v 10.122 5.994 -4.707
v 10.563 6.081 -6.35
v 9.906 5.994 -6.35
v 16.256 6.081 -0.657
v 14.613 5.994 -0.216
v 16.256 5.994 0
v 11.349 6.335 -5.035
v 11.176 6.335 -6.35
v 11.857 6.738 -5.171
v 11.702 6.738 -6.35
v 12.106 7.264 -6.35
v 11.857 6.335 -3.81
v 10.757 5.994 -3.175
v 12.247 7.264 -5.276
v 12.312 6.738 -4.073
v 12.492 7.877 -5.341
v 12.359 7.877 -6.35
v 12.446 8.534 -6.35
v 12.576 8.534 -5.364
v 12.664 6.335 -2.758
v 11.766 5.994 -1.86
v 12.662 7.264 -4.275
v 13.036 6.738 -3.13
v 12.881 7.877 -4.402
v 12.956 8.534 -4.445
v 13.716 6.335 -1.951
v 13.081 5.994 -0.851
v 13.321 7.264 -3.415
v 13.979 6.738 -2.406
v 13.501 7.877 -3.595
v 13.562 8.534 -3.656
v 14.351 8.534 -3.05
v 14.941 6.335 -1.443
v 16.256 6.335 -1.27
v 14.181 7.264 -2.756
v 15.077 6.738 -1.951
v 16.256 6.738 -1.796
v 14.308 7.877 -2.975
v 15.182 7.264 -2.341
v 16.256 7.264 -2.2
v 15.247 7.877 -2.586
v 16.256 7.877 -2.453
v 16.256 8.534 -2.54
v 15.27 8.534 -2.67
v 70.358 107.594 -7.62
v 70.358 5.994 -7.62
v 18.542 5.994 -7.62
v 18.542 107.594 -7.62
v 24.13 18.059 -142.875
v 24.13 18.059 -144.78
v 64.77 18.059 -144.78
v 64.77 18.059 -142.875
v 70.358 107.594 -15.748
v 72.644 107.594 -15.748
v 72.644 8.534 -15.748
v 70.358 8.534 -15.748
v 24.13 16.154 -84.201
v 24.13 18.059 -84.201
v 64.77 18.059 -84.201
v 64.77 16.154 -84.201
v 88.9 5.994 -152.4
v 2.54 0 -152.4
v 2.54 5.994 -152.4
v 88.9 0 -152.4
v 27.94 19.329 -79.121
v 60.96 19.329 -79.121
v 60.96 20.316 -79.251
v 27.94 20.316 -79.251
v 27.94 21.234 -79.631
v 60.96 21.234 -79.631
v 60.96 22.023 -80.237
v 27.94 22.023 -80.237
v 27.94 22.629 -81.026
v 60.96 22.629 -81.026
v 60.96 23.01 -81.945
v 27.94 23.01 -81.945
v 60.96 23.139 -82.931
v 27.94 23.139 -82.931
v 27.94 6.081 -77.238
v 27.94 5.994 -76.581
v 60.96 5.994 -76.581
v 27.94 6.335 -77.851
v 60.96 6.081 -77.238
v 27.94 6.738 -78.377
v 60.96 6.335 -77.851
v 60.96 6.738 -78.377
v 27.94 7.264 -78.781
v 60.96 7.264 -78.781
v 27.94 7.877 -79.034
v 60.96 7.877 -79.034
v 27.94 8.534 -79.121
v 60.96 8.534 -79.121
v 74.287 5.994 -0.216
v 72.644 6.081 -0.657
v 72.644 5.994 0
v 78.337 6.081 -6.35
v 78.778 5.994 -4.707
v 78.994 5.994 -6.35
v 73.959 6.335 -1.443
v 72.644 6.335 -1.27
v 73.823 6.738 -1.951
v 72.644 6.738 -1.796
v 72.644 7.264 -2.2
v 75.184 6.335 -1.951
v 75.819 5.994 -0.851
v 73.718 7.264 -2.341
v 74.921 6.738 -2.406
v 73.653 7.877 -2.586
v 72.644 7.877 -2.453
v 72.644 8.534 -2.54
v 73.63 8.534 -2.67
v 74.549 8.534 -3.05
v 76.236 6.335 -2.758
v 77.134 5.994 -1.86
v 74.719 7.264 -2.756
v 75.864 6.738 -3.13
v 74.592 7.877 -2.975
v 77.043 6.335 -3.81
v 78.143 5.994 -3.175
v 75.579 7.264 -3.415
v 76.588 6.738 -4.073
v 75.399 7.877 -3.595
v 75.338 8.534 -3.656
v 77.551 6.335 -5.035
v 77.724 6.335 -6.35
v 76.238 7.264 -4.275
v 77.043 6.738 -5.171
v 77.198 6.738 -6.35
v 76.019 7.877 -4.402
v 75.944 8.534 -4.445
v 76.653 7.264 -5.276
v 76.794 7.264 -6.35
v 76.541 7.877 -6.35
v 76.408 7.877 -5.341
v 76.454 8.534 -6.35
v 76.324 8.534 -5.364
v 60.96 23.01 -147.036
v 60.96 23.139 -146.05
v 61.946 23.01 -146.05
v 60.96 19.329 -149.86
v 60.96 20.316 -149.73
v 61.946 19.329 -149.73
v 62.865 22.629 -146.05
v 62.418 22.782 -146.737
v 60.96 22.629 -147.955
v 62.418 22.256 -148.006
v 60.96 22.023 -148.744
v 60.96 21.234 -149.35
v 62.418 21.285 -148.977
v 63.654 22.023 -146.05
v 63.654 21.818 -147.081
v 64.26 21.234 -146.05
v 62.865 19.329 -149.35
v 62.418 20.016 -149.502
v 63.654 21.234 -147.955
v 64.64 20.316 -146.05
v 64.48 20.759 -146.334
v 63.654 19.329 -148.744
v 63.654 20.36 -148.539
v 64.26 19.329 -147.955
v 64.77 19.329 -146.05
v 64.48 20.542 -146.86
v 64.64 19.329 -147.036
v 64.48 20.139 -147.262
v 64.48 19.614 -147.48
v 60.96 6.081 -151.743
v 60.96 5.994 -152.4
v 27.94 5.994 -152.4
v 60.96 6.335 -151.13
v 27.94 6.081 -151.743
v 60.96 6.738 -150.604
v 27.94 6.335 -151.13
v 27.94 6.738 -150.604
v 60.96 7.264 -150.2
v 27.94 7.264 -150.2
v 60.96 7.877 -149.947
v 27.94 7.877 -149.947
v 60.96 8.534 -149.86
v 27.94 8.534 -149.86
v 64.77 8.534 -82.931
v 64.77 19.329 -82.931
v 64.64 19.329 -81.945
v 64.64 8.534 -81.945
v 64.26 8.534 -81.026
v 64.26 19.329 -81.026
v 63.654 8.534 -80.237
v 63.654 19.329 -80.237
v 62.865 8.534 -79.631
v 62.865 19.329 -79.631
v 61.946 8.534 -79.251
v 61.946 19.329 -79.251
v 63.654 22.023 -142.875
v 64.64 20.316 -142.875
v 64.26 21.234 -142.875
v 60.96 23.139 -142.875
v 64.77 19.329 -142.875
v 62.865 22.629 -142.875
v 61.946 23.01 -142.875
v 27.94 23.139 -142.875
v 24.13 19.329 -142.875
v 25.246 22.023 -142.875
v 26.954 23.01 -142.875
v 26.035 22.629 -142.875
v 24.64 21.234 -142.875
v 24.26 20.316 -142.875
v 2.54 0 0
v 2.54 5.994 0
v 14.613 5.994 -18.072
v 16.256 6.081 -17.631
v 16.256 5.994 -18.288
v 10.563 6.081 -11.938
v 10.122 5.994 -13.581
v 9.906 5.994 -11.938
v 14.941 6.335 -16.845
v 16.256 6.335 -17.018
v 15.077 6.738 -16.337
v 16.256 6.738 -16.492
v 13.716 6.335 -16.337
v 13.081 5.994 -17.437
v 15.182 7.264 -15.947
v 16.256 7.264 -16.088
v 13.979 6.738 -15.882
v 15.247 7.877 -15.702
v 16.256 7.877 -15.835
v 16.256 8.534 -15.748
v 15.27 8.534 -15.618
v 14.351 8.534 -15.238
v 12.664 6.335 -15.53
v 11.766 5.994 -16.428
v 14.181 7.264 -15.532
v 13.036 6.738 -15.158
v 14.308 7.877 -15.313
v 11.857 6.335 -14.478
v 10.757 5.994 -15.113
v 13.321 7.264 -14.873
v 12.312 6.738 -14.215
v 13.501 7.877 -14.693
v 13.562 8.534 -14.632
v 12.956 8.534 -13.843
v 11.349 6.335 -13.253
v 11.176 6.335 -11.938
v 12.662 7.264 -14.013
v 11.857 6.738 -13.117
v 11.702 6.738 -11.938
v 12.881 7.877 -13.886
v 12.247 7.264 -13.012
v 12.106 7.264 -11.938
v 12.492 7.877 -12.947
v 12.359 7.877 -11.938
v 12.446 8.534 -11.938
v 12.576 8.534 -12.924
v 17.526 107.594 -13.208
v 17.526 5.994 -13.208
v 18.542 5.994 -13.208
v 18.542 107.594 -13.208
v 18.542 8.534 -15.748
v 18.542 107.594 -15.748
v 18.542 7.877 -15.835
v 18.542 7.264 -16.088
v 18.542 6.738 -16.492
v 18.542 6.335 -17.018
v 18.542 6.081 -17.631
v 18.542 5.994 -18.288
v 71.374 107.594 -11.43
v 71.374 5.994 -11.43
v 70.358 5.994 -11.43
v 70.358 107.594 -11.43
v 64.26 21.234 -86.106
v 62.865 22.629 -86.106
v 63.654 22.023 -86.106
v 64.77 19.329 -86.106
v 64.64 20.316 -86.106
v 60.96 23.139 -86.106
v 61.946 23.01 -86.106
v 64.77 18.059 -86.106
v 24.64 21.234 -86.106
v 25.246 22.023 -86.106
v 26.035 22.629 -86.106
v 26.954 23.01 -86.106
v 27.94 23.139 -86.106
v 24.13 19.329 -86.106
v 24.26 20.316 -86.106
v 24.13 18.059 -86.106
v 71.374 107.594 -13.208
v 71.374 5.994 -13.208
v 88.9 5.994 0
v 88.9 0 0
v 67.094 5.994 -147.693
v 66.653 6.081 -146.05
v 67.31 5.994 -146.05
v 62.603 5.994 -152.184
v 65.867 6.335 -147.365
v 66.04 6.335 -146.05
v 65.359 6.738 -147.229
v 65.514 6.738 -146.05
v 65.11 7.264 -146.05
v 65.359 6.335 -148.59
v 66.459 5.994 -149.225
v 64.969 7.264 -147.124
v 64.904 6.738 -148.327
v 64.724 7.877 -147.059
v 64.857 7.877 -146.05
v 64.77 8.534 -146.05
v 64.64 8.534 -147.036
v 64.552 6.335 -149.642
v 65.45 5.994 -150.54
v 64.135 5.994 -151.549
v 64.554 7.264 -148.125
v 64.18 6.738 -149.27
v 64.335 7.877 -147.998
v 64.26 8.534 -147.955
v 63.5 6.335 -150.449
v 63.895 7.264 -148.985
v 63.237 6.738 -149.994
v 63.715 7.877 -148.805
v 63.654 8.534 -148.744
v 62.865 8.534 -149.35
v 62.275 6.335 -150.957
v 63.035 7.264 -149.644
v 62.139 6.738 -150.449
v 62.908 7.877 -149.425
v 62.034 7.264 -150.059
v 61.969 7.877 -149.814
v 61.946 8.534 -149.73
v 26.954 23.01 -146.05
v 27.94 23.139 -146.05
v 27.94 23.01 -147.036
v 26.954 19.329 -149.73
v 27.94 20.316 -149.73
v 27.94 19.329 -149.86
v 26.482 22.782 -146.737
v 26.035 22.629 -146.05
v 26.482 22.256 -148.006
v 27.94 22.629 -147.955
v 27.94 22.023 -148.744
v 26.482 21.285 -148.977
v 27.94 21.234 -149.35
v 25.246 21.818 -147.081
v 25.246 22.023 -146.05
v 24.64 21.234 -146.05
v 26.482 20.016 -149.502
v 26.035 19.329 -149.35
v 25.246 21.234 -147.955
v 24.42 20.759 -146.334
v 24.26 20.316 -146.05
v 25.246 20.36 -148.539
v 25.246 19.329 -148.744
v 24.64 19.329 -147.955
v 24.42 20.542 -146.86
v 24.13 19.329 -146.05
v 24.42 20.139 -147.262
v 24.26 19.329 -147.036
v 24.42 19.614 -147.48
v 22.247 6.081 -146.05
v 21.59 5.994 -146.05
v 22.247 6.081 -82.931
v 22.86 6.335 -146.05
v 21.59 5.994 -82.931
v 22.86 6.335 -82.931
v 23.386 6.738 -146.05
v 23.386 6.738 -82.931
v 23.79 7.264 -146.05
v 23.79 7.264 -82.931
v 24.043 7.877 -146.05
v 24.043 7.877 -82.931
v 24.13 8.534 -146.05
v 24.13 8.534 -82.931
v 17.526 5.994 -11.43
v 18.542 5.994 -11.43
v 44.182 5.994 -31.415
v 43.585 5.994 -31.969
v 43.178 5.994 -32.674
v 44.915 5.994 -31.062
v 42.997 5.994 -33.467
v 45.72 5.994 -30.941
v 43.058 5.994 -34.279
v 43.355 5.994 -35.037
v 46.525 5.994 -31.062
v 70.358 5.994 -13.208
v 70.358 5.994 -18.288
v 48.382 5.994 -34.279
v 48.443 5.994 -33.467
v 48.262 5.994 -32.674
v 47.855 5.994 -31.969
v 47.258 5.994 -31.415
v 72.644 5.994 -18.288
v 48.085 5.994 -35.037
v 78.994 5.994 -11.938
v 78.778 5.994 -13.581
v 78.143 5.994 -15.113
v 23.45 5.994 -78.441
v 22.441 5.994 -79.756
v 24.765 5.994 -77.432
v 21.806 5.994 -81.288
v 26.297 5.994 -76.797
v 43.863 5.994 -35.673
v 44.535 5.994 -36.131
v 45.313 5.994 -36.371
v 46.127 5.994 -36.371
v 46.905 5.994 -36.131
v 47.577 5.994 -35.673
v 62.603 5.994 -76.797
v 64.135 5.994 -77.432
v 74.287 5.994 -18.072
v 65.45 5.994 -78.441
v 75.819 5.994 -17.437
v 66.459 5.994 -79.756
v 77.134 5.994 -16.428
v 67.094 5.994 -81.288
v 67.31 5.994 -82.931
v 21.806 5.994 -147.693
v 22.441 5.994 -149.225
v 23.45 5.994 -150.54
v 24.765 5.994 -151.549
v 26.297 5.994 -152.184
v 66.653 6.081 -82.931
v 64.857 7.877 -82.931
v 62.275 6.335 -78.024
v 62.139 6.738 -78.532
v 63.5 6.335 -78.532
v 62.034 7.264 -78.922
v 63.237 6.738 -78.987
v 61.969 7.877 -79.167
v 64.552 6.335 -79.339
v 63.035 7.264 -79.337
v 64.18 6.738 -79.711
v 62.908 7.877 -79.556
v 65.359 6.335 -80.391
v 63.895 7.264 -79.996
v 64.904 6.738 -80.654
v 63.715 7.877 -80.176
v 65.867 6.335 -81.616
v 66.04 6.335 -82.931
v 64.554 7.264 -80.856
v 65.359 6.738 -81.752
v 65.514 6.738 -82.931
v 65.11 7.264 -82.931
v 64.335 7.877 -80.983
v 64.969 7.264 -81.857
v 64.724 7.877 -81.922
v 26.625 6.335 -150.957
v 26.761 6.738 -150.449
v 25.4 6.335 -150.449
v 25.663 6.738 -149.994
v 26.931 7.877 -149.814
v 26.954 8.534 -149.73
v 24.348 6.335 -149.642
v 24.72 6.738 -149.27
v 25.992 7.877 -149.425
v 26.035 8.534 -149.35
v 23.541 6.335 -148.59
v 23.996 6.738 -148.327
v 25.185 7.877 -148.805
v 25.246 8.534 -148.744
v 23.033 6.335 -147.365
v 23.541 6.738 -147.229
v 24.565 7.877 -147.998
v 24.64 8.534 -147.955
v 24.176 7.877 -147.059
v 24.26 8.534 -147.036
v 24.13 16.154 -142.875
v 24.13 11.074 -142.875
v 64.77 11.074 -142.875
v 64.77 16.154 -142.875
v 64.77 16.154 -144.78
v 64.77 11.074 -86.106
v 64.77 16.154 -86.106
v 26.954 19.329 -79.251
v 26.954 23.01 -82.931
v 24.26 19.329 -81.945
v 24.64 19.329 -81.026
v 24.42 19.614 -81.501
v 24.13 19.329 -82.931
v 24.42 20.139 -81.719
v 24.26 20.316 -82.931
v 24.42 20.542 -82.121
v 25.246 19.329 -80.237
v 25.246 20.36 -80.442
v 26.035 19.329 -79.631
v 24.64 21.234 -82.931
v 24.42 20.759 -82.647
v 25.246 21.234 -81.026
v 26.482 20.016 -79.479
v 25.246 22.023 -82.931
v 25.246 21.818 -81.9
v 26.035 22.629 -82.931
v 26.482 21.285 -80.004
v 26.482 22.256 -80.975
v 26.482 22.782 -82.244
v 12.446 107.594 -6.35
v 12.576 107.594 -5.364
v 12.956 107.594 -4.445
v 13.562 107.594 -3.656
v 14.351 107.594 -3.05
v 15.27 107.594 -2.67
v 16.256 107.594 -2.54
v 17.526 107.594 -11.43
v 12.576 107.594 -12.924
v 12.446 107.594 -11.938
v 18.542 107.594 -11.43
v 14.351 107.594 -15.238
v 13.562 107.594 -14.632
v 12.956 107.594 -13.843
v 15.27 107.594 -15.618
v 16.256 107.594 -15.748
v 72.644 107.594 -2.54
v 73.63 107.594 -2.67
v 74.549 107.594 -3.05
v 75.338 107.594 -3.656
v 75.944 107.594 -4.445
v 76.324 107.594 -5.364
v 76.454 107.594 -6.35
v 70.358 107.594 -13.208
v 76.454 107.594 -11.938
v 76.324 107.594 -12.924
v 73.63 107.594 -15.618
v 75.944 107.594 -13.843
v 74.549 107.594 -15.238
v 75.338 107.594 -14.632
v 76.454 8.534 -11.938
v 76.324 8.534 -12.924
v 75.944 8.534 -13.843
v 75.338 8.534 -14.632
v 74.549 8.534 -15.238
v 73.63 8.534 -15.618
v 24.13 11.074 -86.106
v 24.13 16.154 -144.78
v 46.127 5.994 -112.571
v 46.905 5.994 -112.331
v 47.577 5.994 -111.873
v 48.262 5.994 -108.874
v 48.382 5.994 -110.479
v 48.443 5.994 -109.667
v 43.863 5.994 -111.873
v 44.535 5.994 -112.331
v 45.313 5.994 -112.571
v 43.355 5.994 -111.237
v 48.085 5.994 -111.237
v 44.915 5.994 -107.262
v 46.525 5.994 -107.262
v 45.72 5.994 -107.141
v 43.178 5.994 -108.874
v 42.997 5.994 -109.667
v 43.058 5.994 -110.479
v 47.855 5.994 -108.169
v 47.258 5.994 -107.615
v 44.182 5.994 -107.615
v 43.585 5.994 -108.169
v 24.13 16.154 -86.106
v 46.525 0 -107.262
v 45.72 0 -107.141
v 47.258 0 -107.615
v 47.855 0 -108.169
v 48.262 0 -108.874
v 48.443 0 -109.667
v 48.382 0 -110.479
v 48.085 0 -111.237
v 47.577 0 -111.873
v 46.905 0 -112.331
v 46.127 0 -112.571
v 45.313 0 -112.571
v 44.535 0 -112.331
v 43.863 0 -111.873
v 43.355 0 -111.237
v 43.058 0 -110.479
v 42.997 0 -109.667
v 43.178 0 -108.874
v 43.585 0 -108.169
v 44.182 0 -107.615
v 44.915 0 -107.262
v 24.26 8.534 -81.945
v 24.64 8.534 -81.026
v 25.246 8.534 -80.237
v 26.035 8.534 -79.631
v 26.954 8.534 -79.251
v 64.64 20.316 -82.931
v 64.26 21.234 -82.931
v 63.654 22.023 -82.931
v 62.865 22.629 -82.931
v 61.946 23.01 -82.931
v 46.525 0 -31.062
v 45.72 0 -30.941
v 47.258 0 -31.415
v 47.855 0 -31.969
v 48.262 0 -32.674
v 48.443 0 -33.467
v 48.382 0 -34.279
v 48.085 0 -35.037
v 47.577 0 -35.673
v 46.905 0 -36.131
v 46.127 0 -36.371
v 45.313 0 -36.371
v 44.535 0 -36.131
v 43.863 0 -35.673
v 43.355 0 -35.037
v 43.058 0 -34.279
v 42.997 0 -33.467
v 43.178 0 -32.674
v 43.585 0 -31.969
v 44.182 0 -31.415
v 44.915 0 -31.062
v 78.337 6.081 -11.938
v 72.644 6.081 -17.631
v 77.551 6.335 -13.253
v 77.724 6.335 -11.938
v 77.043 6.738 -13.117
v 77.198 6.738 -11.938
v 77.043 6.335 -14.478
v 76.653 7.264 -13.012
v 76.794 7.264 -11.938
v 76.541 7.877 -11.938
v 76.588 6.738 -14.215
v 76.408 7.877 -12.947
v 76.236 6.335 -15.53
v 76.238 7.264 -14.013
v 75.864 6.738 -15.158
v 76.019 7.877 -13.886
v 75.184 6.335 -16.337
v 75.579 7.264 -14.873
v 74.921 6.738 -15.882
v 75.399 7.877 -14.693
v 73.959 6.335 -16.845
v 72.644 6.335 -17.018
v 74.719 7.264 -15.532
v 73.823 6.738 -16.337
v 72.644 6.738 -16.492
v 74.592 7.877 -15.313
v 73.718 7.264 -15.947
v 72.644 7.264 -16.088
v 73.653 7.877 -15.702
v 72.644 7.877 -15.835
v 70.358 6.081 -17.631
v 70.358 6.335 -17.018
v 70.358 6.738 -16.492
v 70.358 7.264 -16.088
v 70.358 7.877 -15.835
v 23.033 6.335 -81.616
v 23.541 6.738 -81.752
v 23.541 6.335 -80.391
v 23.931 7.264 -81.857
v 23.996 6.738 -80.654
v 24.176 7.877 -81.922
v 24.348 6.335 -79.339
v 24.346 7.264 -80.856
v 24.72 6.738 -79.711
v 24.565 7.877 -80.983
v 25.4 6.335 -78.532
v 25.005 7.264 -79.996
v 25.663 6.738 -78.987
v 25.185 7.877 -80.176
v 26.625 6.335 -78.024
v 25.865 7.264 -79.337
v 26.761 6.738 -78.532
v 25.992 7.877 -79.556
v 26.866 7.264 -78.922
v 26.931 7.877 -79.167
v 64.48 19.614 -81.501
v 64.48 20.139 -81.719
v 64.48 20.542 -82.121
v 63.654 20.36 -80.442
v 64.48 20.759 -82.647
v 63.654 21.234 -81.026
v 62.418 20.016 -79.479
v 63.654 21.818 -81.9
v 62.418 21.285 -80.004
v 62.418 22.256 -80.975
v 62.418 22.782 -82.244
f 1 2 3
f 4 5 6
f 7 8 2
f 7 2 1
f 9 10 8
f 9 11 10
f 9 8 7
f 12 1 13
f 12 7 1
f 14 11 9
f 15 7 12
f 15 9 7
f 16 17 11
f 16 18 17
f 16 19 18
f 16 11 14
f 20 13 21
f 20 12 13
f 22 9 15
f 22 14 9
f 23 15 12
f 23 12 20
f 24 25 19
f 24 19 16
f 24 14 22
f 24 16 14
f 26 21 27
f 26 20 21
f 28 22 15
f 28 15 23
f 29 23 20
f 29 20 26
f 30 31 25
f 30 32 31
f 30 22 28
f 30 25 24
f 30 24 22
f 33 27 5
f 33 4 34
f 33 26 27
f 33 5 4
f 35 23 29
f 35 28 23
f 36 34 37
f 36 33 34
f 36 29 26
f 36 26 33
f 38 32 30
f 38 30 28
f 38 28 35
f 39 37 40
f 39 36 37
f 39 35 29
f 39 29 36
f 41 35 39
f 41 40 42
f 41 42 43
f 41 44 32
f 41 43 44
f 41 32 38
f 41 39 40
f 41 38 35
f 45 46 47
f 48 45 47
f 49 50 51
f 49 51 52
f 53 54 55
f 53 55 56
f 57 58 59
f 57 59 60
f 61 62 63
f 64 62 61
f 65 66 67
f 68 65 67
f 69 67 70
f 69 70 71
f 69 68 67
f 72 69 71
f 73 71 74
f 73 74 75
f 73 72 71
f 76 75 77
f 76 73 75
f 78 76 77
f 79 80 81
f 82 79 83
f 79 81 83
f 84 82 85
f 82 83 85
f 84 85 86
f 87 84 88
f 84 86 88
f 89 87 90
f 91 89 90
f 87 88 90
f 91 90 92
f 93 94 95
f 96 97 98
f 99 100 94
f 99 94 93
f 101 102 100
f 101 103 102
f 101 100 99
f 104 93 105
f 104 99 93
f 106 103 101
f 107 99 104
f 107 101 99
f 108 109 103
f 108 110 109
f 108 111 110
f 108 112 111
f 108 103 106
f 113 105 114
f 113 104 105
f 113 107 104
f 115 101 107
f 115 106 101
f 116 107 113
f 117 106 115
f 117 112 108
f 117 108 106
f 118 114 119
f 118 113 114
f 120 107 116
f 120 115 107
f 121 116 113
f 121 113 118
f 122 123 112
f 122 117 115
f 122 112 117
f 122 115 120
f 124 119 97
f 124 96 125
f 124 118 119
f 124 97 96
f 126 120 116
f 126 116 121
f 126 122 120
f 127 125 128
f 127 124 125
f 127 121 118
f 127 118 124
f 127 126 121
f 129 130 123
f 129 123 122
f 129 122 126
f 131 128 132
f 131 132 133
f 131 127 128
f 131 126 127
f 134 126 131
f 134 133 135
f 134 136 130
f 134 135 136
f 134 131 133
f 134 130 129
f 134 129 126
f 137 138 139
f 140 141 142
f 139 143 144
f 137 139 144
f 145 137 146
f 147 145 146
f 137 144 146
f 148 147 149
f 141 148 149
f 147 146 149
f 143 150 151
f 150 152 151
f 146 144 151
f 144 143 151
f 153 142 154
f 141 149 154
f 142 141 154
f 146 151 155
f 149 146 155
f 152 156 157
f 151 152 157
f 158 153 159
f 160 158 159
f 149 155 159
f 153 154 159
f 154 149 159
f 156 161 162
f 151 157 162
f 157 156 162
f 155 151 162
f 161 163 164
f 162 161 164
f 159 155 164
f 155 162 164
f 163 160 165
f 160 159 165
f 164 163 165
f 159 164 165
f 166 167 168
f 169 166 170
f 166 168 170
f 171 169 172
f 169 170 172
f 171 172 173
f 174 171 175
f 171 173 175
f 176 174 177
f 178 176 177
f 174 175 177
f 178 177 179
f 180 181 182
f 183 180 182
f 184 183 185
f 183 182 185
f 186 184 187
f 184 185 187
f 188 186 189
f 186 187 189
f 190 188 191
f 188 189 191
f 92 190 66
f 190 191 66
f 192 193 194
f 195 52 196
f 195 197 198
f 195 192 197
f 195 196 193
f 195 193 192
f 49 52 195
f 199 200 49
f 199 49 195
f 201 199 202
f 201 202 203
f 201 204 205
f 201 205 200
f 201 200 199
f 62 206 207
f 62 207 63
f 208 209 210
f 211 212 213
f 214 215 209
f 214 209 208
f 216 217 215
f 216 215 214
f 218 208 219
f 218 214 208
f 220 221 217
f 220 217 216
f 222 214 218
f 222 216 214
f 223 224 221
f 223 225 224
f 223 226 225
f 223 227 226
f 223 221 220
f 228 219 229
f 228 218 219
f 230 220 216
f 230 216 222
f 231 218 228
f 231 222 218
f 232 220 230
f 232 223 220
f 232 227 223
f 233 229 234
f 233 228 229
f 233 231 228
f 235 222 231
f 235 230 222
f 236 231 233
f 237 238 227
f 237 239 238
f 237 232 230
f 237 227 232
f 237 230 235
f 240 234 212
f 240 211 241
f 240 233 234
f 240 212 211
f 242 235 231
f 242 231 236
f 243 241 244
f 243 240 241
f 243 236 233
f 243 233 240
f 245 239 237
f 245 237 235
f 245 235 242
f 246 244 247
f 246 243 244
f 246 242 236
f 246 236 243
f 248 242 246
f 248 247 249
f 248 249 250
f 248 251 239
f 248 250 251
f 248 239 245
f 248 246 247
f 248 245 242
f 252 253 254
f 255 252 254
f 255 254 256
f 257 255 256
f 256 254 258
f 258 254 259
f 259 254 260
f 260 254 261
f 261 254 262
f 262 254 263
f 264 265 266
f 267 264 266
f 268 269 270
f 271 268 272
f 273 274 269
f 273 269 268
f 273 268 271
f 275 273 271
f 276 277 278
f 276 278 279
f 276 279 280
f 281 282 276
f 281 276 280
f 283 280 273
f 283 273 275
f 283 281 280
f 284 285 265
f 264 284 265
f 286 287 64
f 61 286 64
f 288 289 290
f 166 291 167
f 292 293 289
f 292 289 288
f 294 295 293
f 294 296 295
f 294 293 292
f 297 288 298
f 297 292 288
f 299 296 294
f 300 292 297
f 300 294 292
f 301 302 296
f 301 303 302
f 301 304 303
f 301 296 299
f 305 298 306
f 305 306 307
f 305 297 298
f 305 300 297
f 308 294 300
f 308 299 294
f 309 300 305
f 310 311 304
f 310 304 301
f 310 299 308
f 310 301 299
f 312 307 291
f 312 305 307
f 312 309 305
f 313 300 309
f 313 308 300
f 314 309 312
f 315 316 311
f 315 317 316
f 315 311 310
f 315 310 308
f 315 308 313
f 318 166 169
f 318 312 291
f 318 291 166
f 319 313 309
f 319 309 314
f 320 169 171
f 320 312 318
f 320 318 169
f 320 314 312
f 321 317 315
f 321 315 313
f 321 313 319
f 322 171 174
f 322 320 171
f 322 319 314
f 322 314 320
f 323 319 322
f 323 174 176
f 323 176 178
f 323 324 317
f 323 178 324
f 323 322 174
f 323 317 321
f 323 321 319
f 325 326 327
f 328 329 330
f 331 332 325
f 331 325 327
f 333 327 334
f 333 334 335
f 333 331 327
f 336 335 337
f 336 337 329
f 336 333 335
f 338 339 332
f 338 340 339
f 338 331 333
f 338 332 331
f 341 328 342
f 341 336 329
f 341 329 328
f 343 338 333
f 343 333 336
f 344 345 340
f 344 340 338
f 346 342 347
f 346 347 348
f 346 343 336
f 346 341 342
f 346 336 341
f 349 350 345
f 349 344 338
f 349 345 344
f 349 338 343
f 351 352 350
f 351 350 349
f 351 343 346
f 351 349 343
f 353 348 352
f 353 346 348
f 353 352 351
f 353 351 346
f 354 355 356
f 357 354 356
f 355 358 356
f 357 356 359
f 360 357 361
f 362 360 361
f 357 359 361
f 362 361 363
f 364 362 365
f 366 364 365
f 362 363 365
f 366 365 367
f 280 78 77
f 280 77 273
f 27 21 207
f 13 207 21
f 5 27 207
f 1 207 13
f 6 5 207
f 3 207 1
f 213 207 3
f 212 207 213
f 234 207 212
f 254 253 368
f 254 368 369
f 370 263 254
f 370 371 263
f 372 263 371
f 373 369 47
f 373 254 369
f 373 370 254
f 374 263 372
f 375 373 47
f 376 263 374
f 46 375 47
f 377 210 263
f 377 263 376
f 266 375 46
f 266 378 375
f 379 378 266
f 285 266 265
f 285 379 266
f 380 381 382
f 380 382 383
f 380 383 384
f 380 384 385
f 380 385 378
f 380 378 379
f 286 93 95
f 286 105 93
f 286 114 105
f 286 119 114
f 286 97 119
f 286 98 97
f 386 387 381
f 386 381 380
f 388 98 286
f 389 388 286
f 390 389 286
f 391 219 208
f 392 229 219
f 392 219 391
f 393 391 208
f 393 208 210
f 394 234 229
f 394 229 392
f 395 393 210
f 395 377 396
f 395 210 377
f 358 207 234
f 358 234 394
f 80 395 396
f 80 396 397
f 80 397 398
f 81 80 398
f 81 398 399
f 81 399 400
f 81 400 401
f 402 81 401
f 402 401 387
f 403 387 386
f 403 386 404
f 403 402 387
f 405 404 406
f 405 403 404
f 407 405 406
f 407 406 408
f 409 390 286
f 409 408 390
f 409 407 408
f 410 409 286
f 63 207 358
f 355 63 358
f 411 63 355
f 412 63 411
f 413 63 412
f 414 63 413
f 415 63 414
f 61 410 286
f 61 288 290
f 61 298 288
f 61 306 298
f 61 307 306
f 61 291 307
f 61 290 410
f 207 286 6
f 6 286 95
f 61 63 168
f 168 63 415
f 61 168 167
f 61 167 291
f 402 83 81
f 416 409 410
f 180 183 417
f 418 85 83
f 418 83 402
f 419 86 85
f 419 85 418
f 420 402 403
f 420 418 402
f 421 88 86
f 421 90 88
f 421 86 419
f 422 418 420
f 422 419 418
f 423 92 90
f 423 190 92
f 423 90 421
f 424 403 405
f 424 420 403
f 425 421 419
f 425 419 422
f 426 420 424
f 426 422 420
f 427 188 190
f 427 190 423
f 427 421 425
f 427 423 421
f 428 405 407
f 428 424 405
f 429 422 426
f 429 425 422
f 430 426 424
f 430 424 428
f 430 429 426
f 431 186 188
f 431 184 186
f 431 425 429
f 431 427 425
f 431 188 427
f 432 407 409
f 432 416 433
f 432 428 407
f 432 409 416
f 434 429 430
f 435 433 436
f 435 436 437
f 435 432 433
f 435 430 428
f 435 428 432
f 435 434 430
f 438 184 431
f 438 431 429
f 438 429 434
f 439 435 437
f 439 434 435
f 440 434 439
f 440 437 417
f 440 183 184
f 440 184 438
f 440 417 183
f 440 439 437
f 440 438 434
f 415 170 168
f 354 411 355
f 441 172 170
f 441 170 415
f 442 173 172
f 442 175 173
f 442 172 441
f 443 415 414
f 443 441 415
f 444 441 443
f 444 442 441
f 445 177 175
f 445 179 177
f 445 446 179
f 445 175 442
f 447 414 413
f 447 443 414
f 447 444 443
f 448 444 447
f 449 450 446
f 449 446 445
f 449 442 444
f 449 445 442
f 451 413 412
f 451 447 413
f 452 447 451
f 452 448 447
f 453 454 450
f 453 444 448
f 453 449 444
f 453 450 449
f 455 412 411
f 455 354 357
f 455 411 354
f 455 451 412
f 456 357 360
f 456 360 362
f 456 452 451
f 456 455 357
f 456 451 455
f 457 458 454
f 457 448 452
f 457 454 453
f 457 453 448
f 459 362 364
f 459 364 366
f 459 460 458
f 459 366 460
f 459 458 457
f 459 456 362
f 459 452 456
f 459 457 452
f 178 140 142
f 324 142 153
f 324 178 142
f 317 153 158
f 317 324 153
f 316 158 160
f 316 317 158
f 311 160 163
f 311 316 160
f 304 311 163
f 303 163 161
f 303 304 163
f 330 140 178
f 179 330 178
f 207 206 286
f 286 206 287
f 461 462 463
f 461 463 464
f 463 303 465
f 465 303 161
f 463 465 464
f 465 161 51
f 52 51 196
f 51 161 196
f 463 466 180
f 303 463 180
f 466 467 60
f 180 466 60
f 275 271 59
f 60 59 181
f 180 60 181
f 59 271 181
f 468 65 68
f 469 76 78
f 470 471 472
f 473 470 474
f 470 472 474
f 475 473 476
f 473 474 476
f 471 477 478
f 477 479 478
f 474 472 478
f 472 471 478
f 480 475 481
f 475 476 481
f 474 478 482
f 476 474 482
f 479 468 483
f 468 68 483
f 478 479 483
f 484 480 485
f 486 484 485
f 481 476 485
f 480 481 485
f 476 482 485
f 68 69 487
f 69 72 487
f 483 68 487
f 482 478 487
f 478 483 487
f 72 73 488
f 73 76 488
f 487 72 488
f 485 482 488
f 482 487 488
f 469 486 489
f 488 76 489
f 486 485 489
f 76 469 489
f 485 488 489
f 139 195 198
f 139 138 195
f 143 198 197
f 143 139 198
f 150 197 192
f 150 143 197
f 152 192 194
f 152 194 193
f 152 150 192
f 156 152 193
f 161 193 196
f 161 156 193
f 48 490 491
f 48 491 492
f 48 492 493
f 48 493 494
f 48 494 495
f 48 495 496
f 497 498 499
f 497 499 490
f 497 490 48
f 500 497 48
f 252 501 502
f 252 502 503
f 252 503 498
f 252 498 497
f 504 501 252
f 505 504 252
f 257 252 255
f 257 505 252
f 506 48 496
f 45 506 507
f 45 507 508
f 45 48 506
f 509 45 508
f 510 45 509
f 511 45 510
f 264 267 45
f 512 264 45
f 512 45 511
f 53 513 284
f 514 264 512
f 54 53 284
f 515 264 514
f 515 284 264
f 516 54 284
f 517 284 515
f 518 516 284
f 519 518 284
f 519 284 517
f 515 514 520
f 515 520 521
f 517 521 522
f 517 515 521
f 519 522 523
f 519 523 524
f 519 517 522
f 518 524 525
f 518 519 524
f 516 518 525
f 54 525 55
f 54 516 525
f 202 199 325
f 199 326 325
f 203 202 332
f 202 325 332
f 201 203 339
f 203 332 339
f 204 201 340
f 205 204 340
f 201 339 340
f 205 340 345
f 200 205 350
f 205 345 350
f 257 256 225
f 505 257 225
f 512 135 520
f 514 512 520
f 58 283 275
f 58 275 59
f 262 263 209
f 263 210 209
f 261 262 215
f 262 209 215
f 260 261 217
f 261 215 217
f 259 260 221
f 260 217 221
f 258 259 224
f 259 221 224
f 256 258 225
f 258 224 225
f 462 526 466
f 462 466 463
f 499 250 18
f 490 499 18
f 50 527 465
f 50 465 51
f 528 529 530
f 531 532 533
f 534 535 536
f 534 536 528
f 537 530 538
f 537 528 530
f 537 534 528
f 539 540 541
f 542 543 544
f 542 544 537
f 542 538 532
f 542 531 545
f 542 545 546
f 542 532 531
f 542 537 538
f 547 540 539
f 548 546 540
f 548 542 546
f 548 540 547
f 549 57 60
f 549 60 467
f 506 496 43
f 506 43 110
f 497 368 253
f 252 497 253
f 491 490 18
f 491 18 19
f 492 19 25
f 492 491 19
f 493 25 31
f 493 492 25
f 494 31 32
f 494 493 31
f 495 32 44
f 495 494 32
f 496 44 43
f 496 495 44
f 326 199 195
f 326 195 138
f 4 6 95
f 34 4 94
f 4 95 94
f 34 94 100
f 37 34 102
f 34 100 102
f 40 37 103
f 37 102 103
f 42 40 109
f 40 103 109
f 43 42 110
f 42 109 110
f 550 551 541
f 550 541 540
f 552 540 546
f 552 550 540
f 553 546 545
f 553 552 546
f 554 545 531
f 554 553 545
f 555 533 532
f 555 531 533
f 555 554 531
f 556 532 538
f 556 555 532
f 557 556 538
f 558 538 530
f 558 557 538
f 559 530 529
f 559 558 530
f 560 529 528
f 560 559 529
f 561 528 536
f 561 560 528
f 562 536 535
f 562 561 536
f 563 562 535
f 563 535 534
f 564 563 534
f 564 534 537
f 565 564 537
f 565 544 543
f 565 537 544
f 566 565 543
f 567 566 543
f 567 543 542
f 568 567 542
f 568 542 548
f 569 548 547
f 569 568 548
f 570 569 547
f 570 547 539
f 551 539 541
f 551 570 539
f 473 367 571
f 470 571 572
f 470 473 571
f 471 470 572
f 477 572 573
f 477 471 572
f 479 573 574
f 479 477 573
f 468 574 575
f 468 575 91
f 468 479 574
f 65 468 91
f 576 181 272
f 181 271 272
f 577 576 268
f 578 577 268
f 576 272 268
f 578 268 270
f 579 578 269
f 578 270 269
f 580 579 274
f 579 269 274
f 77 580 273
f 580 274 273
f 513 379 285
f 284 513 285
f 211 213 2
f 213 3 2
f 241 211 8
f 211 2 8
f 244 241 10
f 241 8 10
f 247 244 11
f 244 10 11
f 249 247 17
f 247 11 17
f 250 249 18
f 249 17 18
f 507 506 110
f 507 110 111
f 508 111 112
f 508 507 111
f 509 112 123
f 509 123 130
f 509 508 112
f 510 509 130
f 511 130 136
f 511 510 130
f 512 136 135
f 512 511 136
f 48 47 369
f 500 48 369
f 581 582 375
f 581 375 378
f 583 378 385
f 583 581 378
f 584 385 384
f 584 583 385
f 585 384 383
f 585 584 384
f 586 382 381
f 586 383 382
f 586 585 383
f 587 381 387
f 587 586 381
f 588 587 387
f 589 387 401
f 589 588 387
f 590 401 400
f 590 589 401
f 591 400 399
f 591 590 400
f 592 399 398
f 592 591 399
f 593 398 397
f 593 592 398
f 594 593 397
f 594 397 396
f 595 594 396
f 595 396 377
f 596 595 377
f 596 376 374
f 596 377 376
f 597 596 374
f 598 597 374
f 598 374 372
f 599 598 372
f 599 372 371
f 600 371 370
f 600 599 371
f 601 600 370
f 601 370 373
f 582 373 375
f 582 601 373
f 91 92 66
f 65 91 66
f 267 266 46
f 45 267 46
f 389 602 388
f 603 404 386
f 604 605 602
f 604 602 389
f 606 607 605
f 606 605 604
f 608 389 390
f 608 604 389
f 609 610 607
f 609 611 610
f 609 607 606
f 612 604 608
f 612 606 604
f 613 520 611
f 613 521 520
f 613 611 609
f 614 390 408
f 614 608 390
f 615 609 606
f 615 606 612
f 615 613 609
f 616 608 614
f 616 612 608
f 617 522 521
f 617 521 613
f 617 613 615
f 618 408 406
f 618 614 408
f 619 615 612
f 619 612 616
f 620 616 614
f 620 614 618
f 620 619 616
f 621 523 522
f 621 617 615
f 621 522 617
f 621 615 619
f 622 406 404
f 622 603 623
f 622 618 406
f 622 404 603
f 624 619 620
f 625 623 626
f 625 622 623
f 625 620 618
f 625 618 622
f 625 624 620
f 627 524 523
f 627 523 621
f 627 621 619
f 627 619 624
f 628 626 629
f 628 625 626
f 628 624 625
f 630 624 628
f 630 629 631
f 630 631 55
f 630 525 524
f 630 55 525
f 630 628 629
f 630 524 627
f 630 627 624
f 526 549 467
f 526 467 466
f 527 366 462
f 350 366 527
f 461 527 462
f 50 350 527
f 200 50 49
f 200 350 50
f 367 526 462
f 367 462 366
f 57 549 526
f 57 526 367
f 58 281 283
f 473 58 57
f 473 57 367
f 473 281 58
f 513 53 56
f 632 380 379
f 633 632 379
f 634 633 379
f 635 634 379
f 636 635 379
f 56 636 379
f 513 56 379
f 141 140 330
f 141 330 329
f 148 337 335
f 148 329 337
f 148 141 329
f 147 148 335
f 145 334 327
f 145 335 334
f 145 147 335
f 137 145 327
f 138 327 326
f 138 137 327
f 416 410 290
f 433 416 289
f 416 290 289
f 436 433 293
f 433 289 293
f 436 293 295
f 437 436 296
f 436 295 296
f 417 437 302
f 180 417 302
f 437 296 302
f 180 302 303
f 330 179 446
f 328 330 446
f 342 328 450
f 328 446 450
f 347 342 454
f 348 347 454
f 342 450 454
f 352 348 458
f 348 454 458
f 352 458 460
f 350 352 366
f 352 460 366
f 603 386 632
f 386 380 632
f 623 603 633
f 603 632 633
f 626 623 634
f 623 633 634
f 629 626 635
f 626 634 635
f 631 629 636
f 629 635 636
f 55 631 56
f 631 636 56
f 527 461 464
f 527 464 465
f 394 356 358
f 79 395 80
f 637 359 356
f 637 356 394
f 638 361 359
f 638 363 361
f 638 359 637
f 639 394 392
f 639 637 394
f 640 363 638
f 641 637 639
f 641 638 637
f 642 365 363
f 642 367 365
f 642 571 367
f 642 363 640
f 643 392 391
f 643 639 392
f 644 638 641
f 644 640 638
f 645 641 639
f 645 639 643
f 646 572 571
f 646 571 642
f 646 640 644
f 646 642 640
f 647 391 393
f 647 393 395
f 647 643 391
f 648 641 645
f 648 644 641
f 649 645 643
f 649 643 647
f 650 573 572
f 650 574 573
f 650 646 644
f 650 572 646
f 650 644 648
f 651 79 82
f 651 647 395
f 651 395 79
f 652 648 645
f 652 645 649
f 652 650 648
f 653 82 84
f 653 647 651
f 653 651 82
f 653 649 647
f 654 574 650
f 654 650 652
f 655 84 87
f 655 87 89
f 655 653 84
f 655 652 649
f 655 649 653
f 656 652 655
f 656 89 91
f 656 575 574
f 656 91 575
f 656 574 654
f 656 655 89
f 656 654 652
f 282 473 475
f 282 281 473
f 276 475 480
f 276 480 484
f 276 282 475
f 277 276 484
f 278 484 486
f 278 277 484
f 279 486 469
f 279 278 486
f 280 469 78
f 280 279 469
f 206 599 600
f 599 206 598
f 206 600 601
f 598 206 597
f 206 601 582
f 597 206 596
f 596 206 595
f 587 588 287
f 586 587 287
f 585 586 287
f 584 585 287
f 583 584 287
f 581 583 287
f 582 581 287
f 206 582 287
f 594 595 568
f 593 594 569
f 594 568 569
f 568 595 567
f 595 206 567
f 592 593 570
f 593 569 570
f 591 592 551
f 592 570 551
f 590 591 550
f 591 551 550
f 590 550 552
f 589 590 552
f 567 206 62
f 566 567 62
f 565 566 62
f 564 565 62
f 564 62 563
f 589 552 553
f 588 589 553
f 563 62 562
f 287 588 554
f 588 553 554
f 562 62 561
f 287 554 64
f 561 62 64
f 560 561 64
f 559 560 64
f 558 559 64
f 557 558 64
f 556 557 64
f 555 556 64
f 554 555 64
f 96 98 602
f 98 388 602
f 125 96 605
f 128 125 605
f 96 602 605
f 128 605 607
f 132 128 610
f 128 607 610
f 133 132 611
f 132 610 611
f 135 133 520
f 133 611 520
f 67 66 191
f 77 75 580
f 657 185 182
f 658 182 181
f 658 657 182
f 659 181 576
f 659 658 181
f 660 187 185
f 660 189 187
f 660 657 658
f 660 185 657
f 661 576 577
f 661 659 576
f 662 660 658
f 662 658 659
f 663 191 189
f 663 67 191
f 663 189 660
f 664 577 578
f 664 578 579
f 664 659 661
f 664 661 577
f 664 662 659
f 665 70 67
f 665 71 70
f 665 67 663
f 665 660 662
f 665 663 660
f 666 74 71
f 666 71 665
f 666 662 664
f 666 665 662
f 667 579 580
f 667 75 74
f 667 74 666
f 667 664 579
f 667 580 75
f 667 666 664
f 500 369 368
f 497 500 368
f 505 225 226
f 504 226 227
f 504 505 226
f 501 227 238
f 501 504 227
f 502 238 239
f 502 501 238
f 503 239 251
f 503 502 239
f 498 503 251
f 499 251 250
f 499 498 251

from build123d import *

# Parameters (mm, degrees)
SKETCH2_W               = 88.9
SKETCH2_H               = 152.4
BOSS_EXTRUDE1_DEPTH     = 5.9944
CUT_EXTRUDE2_DEPTH      = 177.535840076
CUT_EXTRUDE2_DEPTH_BACK = 177.535840076
SKETCH4_R               = 2.7305
BOSS_EXTRUDE2_DEPTH     = 101.6
FILLET1_R               = 3.81
FILLET2_R               = 2.54
BOSS_EXTRUDE3_DEPTH     = 20.32
FILLET3_R               = 3.81
FILLET6_R               = 3.81
FILLET7_R               = 2.54
CUT_EXTRUDE3_DEPTH      = 204.596488182
CUT_EXTRUDE3_DEPTH_BACK = 204.596488182
SKETCH7_W               = 2.54
SKETCH7_H               = 152.4


with BuildPart() as part:
    # Sketch2 → Boss-Extrude1 (new body)
    with BuildSketch(Plane(origin=(0, 0, 0), x_dir=(1, 0, 0), z_dir=(0, 1, 0))):
        with Locations((44.45, 76.2)):
            Rectangle(SKETCH2_W, SKETCH2_H)
    extrude(amount=BOSS_EXTRUDE1_DEPTH)

    # Sketch4 → Cut-Extrude2 (cut, two sides: drawn at the far end of the back side and taken through both)
    with BuildSketch(Plane(origin=(0, 5.9944, 0), x_dir=(1, 0, 0), z_dir=(0, 1, 0)).offset(-CUT_EXTRUDE2_DEPTH_BACK)):
        with Locations(Location((45.72, 109.871331367, 0), (0, 0, 270))):
            Circle(SKETCH4_R)
        with Locations(Location((45.72, 33.671331367, 0), (0, 0, 270))):
            Circle(SKETCH4_R)
    extrude(amount=CUT_EXTRUDE2_DEPTH + CUT_EXTRUDE2_DEPTH_BACK, mode=Mode.SUBTRACT)

    # Sketch5 → Boss-Extrude2 (add)
    with BuildSketch(Plane(origin=(0, 5.9944, 0), x_dir=(1, 0, 0), z_dir=(0, 1, 0))):
        Polygon((18.542, 15.748), (12.446, 15.748), (12.446, 2.54), (76.454, 2.54), (76.454, 15.748), (70.358, 15.748), (70.358, 13.208), (71.374, 13.208), (71.374, 11.43), (70.358, 11.43), (70.358, 7.62), (18.542, 7.62), (18.542, 11.43), (17.526, 11.43), (17.526, 13.208), (18.542, 13.208), align=None)
    extrude(amount=BOSS_EXTRUDE2_DEPTH)

    # Fillet1
    fillet1_edges = [part.edges().sort_by_distance(p)[0] for p in [
        (12.446, 56.7944, -15.748),
        (12.446, 56.7944, -2.54),
        (76.454, 56.7944, -2.54),
        (76.454, 56.7944, -15.748),
    ]]
    fillet(fillet1_edges, radius=FILLET1_R)

    # Fillet2
    fillet2_edges = [part.edges().sort_by_distance(p)[0] for p in [
        (71.501, 5.9944, -15.748),
        (44.45, 5.9944, -2.54),
        (12.446, 5.9944, -9.144),
        (17.399, 5.9944, -15.748),
        (76.454, 5.9944, -9.144),
        (13.561923164, 5.9944, -3.655923164),
        (13.561923164, 5.9944, -14.632076836),
        (75.338076836, 5.9944, -3.655923164),
        (75.338076836, 5.9944, -14.632076836),
    ]]
    fillet(fillet2_edges, radius=FILLET2_R - 0.0001)  # a hair under: the kernel refuses the full size

    # Sketch6 → Boss-Extrude3 (add, symmetric)
    with BuildSketch(Plane.ZY.offset(-44.45)):
        Polygon((-149.86, 5.9944), (-79.121, 5.9944), (-79.121, 23.1394), (-86.106, 23.1394), (-86.106, 18.0594), (-84.201, 18.0594), (-84.201, 16.1544), (-86.106, 16.1544), (-86.106, 11.0744), (-142.875, 11.0744), (-142.875, 16.1544), (-144.78, 16.1544), (-144.78, 18.0594), (-142.875, 18.0594), (-142.875, 23.1394), (-149.86, 23.1394), align=None)
    extrude(amount=BOSS_EXTRUDE3_DEPTH, both=True)

    # Fillet3
    fillet3_edges = [part.edges().sort_by_distance(p)[0] for p in [
        (44.45, 23.1394, -149.86),
        (44.45, 23.1394, -79.121),
    ]]
    fillet(fillet3_edges, radius=FILLET3_R)

    # Fillet6
    fillet6_edges = [part.edges().sort_by_distance(p)[0] for p in [
        (24.13, 12.6619, -149.86),
        (64.77, 12.6619, -79.121),
        (24.13, 23.1394, -84.5185),
        (24.13, 12.6619, -79.121),
        (64.77, 23.1394, -84.5185),
        (64.77, 12.6619, -149.86),
        (64.77, 23.1394, -144.4625),
        (64.77, 22.023476836, -148.744076836),
        (64.77, 22.023476836, -80.236923164),
        (24.13, 23.1394, -144.4625),
        (24.13, 22.023476836, -148.744076836),
        (24.13, 22.023476836, -80.236923164),
    ]]
    fillet(fillet6_edges, radius=FILLET6_R)

    # Fillet7
    fillet7_edges = [part.edges().sort_by_distance(p)[0] for p in [
        (24.13, 5.9944, -114.4905),
        (64.77, 5.9944, -114.4905),
        (44.45, 5.9944, -79.121),
        (44.45, 5.9944, -149.86),
        (25.245923164, 5.9944, -80.236923164),
        (63.654076836, 5.9944, -80.236923164),
        (63.654076836, 5.9944, -148.744076836),
        (25.245923164, 5.9944, -148.744076836),
    ]]
    fillet(fillet7_edges, radius=FILLET7_R - 0.0001)  # a hair under: the kernel refuses the full size

    # Sketch7 → Cut-Extrude3 (cut, two sides: drawn at the far end of the back side and taken through both)
    with BuildSketch(Plane(origin=(0, 5.9944, 0), x_dir=(1, 0, 0), z_dir=(0, 1, 0)).offset(-CUT_EXTRUDE3_DEPTH_BACK)):
        with Locations((1.27, 76.2)):
            Rectangle(SKETCH7_W, SKETCH7_H)
    extrude(amount=CUT_EXTRUDE3_DEPTH + CUT_EXTRUDE3_DEPTH_BACK, mode=Mode.SUBTRACT)


solid = part.part
